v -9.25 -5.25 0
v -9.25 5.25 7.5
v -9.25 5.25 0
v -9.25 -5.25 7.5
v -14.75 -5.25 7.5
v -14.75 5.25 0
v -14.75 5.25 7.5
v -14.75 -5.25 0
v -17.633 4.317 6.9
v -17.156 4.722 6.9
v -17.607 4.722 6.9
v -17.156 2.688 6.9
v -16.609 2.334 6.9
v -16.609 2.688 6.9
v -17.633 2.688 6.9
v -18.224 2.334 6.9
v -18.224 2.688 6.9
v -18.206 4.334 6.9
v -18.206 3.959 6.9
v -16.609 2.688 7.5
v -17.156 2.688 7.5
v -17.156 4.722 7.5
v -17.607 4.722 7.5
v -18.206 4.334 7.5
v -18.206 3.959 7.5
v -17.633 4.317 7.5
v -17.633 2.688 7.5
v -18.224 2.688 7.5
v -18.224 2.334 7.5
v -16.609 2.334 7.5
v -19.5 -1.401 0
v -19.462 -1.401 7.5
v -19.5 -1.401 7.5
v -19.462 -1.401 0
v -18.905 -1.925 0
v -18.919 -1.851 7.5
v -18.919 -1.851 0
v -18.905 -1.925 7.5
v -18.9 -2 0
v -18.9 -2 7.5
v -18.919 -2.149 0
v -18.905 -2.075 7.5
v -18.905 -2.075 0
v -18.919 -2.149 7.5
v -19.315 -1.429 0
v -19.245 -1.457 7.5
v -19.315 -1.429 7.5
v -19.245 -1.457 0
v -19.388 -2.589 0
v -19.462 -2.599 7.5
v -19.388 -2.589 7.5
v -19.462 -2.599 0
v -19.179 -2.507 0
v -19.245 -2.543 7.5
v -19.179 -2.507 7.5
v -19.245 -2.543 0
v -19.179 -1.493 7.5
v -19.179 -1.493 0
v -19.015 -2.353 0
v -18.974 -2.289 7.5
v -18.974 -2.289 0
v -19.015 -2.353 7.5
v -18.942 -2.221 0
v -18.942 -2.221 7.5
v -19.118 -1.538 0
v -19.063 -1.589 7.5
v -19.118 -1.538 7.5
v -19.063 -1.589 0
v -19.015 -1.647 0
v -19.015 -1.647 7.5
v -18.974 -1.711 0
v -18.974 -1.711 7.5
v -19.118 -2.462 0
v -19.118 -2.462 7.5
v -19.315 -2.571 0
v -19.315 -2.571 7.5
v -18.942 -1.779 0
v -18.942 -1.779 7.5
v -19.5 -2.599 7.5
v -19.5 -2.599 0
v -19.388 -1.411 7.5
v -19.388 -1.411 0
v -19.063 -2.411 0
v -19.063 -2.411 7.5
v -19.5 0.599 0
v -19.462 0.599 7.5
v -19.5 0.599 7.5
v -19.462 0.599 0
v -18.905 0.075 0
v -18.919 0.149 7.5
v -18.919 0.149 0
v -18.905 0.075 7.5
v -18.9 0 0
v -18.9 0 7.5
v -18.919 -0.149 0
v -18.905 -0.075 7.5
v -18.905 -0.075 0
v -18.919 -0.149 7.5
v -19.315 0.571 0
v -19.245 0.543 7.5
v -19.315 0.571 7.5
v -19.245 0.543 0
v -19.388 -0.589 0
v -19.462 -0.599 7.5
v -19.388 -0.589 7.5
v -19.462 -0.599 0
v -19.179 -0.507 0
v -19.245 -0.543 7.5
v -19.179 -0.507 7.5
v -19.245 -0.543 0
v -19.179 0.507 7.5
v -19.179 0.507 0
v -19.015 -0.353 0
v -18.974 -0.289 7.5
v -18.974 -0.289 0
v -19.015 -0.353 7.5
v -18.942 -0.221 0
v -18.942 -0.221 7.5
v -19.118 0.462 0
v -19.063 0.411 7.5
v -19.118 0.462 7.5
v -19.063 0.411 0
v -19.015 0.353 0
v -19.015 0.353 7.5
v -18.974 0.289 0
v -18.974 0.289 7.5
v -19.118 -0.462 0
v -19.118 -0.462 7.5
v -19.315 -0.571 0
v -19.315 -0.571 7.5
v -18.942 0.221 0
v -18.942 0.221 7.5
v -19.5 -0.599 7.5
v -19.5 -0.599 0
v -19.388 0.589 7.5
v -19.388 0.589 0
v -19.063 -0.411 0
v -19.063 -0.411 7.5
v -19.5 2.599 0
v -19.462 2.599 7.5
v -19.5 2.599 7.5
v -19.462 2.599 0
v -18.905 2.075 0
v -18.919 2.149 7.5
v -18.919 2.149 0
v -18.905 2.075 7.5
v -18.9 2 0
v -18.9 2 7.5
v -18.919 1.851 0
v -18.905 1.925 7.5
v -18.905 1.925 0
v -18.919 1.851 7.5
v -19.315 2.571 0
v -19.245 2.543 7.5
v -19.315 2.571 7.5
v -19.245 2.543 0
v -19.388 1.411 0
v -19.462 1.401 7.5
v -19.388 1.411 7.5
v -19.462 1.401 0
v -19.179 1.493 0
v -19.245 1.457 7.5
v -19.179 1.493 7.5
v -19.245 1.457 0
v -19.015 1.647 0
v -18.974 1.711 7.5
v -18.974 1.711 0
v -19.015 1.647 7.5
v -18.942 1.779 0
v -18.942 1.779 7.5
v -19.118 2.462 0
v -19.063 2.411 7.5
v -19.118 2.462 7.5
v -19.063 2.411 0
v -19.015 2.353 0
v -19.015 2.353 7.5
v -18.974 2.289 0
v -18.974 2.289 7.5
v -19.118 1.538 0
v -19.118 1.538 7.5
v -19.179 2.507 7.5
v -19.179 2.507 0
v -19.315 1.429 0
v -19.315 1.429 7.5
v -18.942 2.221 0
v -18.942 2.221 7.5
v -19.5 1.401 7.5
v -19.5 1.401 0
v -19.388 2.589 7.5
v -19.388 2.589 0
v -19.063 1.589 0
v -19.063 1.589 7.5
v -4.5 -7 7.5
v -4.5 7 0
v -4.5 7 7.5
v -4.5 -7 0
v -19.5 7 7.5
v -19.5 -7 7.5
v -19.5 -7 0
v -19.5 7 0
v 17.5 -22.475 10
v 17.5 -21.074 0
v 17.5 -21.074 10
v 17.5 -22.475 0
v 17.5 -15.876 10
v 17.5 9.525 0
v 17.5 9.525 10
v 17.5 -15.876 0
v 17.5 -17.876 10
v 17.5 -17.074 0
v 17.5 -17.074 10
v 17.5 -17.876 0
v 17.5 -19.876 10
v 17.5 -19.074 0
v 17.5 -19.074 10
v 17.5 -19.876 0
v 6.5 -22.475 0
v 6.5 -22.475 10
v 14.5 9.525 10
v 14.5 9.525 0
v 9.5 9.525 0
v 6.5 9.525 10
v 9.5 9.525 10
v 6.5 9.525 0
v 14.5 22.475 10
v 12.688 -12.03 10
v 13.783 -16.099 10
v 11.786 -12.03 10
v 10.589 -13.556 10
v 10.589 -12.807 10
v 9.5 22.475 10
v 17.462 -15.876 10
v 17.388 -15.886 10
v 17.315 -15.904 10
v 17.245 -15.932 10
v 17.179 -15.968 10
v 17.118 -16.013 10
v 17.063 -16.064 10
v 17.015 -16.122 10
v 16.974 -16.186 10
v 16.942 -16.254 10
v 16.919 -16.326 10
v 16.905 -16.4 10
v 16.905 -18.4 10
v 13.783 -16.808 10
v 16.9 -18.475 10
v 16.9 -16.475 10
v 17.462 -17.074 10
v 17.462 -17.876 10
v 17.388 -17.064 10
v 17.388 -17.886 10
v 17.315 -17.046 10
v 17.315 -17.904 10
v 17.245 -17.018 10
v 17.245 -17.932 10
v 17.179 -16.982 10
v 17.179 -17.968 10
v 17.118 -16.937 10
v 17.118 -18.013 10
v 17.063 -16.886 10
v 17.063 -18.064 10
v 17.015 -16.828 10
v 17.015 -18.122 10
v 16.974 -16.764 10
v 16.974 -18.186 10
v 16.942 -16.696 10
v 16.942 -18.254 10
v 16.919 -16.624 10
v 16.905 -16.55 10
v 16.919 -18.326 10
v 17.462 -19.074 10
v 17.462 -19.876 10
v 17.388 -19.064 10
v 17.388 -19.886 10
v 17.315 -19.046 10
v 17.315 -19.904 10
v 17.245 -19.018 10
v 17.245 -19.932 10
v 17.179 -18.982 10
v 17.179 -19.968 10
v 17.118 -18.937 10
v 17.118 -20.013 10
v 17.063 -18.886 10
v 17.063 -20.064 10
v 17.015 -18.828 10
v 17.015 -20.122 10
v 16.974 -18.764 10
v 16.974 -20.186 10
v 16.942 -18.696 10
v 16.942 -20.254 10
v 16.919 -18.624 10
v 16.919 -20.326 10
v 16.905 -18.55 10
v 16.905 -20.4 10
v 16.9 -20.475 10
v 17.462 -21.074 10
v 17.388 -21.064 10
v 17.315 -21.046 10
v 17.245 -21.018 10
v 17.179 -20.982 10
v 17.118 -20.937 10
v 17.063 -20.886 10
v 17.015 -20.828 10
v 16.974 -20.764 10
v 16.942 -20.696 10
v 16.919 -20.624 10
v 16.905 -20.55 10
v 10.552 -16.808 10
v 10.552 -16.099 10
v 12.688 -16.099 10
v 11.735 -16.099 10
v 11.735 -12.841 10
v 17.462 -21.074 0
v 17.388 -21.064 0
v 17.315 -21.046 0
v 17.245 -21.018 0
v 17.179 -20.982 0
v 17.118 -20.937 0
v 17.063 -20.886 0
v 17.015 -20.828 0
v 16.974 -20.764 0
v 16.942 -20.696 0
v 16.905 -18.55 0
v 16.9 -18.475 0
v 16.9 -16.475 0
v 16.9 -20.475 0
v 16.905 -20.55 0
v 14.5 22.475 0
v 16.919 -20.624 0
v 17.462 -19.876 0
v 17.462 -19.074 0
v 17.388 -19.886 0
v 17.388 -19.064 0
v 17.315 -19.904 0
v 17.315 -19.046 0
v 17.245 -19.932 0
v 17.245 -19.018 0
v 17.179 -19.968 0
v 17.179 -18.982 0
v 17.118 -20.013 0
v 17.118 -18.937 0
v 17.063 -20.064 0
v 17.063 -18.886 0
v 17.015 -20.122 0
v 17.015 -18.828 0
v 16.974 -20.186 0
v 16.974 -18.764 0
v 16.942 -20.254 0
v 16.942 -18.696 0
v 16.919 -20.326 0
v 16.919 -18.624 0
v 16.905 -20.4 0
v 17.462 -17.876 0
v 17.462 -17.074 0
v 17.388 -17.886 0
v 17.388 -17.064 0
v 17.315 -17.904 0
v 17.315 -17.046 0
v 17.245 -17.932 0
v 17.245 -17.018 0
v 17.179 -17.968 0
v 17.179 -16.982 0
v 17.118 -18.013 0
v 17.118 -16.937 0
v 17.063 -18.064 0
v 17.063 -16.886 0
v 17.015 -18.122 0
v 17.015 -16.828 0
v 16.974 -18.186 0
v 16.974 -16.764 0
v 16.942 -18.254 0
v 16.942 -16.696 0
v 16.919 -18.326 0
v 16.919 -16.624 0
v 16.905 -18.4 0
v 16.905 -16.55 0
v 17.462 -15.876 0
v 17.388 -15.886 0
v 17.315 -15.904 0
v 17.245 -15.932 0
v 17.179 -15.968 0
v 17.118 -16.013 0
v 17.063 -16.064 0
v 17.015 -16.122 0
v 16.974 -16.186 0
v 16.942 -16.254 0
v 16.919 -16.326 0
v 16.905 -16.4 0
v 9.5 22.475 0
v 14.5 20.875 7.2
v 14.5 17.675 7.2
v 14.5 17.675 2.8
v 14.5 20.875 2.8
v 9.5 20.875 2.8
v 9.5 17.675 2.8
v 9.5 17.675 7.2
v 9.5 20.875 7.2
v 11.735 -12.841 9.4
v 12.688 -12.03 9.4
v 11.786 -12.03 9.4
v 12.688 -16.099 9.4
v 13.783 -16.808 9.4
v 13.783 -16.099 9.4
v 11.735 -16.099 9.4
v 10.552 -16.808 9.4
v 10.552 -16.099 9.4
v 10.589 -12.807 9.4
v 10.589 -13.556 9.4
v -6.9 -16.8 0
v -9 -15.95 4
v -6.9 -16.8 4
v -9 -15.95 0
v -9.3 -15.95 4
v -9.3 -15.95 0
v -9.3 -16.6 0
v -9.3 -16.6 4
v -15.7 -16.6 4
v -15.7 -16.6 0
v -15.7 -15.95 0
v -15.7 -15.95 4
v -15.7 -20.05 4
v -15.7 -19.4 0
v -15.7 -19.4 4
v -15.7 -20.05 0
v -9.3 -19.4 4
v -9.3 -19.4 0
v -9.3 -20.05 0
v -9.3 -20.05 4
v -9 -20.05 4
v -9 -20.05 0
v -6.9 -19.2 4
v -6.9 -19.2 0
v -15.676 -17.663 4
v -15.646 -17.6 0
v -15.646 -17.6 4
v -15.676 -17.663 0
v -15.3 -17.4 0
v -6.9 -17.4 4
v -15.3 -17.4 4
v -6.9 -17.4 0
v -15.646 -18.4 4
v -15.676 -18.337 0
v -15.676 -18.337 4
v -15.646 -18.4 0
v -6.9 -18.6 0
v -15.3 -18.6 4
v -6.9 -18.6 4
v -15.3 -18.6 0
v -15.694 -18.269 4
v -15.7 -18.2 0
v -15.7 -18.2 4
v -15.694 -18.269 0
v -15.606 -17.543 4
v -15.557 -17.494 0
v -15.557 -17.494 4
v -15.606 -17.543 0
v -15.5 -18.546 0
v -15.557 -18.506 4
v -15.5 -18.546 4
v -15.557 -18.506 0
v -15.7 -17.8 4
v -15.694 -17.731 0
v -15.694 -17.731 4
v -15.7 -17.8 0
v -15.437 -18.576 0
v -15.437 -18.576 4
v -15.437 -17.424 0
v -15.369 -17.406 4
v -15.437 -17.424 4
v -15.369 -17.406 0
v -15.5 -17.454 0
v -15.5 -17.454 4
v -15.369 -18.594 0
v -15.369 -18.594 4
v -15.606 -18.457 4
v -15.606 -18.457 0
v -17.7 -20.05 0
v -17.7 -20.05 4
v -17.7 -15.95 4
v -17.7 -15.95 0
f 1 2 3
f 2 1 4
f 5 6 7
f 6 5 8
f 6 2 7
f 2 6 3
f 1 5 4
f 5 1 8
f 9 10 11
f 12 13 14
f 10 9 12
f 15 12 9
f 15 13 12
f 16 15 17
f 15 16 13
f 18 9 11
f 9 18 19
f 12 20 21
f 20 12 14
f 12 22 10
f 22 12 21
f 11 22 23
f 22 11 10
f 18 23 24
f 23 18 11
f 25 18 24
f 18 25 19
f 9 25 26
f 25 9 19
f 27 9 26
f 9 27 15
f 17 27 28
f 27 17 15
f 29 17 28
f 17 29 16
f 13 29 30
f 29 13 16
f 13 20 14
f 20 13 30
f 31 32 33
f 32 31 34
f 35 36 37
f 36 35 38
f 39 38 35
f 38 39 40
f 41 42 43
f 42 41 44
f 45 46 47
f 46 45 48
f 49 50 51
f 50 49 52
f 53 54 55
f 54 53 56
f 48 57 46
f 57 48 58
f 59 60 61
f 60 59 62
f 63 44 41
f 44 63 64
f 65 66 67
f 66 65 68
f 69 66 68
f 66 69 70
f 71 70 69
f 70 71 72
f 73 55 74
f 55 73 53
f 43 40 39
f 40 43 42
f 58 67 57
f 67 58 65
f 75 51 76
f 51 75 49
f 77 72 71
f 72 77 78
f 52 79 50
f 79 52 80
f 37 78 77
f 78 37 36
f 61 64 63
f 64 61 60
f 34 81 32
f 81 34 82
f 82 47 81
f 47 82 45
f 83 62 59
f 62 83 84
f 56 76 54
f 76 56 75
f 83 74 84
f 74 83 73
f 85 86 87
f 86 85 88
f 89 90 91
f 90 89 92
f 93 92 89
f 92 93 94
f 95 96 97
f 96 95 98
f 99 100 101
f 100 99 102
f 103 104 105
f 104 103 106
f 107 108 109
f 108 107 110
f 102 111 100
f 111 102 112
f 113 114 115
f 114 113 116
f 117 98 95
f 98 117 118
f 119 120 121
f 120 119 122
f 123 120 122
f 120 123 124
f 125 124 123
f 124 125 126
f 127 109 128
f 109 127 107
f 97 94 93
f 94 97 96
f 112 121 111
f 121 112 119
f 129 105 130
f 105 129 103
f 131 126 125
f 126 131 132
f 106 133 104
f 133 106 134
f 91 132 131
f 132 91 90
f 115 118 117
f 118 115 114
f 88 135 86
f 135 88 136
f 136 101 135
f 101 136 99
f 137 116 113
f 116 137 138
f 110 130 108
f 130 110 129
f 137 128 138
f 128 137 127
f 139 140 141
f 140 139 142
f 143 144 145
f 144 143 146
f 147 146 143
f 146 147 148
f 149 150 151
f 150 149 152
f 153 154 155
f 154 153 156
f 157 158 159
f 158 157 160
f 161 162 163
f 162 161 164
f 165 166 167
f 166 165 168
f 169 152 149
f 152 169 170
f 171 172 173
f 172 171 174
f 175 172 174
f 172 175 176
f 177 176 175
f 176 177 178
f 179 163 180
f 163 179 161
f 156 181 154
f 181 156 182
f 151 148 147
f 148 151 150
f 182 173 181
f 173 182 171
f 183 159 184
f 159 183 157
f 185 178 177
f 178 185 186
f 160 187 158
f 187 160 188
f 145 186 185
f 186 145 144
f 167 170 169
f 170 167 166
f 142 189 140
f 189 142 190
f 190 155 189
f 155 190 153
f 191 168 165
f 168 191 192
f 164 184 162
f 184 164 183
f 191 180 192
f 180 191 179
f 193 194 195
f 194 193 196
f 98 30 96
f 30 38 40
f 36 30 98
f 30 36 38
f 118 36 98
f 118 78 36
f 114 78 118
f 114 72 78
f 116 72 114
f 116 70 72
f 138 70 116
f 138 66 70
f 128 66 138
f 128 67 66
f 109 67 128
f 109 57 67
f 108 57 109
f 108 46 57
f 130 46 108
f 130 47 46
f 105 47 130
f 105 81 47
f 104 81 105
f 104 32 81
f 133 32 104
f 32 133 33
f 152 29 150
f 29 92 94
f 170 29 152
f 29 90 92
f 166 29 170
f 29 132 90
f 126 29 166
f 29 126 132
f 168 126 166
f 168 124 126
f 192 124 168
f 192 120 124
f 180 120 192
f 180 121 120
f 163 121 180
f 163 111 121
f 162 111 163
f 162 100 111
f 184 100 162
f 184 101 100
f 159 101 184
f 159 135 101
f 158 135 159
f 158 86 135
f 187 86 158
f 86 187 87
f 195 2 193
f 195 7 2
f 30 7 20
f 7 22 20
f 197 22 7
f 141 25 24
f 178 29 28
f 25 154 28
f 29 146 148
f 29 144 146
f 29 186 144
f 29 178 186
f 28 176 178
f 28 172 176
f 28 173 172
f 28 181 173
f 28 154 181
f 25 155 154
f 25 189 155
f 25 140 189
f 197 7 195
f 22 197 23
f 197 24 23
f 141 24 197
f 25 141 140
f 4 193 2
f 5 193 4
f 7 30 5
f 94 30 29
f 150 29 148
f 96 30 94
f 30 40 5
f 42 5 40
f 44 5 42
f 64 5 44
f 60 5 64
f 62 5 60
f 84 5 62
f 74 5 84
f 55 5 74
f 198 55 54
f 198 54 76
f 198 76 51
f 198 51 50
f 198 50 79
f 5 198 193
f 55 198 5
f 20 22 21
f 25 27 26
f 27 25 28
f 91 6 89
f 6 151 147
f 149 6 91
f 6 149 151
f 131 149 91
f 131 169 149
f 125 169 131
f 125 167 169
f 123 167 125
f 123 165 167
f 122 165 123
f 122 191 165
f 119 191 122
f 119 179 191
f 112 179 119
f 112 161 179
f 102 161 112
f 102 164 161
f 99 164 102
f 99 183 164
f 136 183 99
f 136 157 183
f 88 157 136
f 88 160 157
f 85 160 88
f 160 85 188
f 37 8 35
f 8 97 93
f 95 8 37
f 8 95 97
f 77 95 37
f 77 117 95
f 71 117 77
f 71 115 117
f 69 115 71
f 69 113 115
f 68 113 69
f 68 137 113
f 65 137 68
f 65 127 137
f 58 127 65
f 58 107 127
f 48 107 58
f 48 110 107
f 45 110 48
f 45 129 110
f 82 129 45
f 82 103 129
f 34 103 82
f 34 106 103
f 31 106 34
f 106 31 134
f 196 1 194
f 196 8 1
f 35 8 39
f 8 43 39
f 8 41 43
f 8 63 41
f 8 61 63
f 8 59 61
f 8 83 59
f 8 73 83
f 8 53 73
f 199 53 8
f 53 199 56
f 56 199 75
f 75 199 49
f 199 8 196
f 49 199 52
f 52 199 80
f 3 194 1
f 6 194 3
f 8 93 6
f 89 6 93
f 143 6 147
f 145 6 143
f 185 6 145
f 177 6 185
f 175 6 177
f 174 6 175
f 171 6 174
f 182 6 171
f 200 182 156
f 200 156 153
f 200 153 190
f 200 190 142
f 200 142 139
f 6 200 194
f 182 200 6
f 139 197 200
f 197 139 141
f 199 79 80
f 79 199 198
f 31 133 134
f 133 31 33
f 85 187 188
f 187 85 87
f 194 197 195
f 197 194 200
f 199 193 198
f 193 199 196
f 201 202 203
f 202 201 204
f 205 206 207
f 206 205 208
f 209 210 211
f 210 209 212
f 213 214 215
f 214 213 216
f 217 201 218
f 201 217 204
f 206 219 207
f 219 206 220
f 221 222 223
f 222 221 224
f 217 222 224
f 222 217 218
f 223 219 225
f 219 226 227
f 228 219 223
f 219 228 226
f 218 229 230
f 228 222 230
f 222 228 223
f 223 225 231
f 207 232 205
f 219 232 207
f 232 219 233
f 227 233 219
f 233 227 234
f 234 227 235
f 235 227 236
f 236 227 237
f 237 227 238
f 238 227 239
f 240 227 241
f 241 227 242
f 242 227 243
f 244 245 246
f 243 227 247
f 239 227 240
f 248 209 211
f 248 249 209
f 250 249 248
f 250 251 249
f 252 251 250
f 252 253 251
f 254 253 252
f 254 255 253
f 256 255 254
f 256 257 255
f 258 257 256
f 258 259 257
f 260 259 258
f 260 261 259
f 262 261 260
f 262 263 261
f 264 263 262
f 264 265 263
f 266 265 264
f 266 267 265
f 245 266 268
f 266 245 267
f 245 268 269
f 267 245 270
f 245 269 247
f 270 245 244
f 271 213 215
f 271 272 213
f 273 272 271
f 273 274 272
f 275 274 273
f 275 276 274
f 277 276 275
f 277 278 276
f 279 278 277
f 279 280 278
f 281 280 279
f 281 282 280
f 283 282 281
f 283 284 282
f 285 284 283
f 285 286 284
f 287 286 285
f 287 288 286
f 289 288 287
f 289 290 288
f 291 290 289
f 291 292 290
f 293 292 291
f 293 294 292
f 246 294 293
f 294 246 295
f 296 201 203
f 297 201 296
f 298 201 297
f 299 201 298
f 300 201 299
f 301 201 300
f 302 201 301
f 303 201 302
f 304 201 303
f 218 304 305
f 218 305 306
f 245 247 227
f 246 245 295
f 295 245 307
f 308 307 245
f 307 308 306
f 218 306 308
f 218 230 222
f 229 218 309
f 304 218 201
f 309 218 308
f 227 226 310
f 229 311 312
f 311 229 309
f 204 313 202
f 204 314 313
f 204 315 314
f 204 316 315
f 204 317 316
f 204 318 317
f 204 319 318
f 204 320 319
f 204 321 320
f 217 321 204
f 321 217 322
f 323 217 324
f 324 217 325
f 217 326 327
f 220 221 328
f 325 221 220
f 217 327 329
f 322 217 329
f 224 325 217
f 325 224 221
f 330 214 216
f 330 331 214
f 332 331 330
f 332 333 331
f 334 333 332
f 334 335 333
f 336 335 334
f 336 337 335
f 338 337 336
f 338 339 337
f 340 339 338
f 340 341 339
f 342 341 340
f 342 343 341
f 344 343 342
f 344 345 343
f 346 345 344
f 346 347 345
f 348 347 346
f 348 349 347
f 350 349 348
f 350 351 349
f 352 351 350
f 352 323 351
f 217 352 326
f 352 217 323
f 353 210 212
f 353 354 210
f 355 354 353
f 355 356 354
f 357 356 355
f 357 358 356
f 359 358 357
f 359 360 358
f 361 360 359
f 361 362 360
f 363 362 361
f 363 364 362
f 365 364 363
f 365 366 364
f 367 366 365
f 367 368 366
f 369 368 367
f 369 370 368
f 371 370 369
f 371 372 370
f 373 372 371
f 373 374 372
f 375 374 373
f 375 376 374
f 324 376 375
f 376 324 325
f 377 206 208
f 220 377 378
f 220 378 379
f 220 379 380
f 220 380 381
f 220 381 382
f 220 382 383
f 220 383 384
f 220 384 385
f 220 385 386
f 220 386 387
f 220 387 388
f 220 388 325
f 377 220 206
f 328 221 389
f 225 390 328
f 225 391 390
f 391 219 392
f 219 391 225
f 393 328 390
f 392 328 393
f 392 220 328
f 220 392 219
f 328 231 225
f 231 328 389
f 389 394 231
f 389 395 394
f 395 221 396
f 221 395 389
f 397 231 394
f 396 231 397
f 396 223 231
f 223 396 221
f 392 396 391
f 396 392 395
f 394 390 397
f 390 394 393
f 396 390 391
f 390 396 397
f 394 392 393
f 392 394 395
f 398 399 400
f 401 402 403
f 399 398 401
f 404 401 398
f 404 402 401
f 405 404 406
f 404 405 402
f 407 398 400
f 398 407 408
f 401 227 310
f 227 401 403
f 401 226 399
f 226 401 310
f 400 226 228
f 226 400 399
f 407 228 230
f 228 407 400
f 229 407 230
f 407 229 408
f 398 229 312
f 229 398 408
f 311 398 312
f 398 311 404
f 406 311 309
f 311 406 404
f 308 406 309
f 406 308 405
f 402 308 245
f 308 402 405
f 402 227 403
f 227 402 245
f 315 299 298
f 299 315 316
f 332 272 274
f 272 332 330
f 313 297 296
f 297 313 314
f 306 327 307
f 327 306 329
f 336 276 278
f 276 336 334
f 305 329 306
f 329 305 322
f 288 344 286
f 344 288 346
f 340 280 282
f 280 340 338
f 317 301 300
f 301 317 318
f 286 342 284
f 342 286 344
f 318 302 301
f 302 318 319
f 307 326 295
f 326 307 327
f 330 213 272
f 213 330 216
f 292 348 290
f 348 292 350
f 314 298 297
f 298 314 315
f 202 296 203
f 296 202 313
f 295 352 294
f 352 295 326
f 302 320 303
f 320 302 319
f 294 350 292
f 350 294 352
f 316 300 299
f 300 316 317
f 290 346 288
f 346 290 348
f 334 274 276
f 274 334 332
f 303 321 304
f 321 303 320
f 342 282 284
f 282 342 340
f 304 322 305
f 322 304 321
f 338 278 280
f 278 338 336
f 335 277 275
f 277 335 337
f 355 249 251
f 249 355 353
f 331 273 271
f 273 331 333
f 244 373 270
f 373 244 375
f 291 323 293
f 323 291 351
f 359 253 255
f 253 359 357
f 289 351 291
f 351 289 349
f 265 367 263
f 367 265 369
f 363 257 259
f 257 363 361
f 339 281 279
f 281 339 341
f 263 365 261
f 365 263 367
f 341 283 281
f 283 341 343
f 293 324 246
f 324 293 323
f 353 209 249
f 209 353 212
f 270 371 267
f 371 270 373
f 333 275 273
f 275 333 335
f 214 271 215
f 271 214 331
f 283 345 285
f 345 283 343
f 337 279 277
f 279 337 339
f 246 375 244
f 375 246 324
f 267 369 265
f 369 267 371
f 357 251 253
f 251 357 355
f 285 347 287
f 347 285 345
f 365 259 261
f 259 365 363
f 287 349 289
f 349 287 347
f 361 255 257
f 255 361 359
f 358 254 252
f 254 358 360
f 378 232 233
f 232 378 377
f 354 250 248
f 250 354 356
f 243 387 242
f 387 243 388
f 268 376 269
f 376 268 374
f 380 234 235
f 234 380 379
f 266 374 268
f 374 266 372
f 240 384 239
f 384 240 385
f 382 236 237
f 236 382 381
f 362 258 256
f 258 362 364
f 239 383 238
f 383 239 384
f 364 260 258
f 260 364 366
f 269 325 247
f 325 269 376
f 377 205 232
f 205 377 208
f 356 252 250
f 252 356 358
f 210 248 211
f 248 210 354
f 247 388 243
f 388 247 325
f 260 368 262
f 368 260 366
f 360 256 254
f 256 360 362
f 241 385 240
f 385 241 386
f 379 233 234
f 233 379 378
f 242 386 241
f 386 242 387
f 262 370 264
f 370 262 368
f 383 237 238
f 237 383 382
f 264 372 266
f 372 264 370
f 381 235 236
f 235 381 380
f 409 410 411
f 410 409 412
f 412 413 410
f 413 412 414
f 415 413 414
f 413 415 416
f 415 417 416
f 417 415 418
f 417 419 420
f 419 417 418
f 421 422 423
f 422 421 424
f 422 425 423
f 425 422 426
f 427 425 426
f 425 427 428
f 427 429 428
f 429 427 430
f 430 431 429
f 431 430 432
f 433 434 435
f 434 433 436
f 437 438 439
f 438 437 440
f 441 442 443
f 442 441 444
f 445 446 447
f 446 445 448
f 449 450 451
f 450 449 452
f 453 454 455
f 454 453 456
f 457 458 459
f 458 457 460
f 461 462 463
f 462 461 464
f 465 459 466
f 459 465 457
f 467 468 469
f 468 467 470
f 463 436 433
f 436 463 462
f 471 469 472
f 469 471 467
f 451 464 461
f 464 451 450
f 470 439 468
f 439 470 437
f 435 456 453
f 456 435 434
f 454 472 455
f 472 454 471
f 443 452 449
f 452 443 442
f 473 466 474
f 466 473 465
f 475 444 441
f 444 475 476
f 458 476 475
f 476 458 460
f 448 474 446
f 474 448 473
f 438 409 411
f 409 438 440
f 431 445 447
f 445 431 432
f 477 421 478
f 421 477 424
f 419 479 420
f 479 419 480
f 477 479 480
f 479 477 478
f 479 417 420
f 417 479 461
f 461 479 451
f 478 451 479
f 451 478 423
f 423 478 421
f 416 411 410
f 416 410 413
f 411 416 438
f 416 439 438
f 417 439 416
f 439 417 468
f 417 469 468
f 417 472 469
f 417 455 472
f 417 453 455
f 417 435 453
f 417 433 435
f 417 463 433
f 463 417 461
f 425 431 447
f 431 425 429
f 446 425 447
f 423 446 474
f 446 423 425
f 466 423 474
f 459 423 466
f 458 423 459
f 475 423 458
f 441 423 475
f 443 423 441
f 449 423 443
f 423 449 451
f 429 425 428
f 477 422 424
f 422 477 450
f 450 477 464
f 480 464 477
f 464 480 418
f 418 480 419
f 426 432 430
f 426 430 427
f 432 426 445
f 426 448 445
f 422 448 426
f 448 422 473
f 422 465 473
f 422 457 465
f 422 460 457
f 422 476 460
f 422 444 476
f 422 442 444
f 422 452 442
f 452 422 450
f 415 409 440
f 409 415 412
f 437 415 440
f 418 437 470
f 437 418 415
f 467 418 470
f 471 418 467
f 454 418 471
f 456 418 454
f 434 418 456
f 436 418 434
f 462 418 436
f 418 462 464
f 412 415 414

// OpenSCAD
$fn = 50;

difference() {
	union() {
		translate(v = [-12, -5, 0]) {
			rotate(a = [0, 0, 0]) {
				difference() {
					union() {
						translate(v = [-7.5, -2.0, 0]) {
							cube(size = [15.0, 14.0, 7.5]);
						}
					}
					union() {
						translate(v = [-2.75, -0.25, -0.1]) {
							cube(size = [5.5, 10.5, 7.7]);
						}
						translate(v = [-5.5, 8.5, 6.9]) {
							linear_extrude(height = 0.7) {
								text(font = "Arial:style=Bold", halign = "center", size = 2.5, text = "1", valign = "center");
							}
						}
						translate(v = [-7.5, 3, -0.1]) {
							cylinder(h = 7.7, r = 0.6);
						}
						translate(v = [-7.5, 5, -0.1]) {
							cylinder(h = 7.7, r = 0.6);
						}
						translate(v = [-7.5, 7, -0.1]) {
							cylinder(h = 7.7, r = 0.6);
						}
					}
				}
			}
		}
		translate(v = [12, 9.525, 0]) {
			rotate(a = [90, 0, 0]) {
				difference() {
					union() {
						translate(v = [-5.5, 0, 0]) {
							cube(size = [11.0, 10.0, 32.0]);
						}
						translate(v = [-2.5, 0, -12.95]) {
							cube(size = [5.0, 10.0, 13.049999999999999]);
						}
					}
					union() {
						translate(v = [-2.6, 2.8, -11.35]) {
							cube(size = [5.2, 4.4, 3.1999999999999997]);
						}
						translate(v = [0, 9.4, 24.0]) {
							rotate(a = [-90, 0, 0]) {
								linear_extrude(height = 0.7) {
									text(font = "Arial:style=Bold", halign = "center", size = 5.0, text = "1", valign = "center");
								}
							}
						}
						translate(v = [5.5, 10.1, 30.0]) {
							rotate(a = [90, 0, 0]) {
								cylinder(h = 10.2, r = 0.6);
							}
						}
						translate(v = [5.5, 10.1, 28.0]) {
							rotate(a = [90, 0, 0]) {
								cylinder(h = 10.2, r = 0.6);
							}
						}
						translate(v = [5.5, 10.1, 26.0]) {
							rotate(a = [90, 0, 0]) {
								cylinder(h = 10.2, r = 0.6);
							}
						}
					}
				}
			}
		}
		translate(v = [-12, -18, 0]) {
			rotate(a = [90, 0, 0]) {
				difference() {
					union() {
						translate(v = [-5.7, 0, -2.05]) {
							cube(size = [10.8, 4.0, 4.1]);
						}
					}
					union() {
						translate(v = [0, 4.1, 0]) {
							rotate(a = [90, 0, 0]) {
								linear_extrude(height = 4.2) {
									polygon(points = [[-3.7, -1.4], [2.7, -1.4], [2.7, -2.05], [3.0, -2.05], [5.1, -1.2], [5.2, -1.2], [5.2, -2.15], [-3.7, -2.15]]);
								}
							}
						}
						translate(v = [0, 4.1, 0]) {
							rotate(a = [90, 0, 0]) {
								linear_extrude(height = 4.2) {
									polygon(points = [[-3.7, 1.4], [2.7, 1.4], [2.7, 2.05], [3.0, 2.05], [5.1, 1.2], [5.2, 1.2], [5.2, 2.15], [-3.7, 2.15]]);
								}
							}
						}
						translate(v = [0, 4.1, 0]) {
							rotate(a = [90, 0, 0]) {
								linear_extrude(height = 4.2) {
									polygon(points = [[-3.7, 0.2], [-3.693923, 0.269459], [-3.675877, 0.336808], [-3.64641, 0.4], [-3.606418, 0.457115], [-3.557115, 0.506418], [-3.5, 0.54641], [-3.436808, 0.575877], [-3.369459, 0.593923], [-3.3, 0.6], [5.2, 0.6], [5.2, -0.6], [-3.3, -0.6], [-3.369459, -0.593923], [-3.436808, -0.575877], [-3.5, -0.54641], [-3.557115, -0.506418], [-3.606418, -0.457115], [-3.64641, -0.4], [-3.675877, -0.336808], [-3.693923, -0.269459], [-3.7, -0.2]]);
								}
							}
						}
					}
				}
			}
		}
	}
	union();
}
